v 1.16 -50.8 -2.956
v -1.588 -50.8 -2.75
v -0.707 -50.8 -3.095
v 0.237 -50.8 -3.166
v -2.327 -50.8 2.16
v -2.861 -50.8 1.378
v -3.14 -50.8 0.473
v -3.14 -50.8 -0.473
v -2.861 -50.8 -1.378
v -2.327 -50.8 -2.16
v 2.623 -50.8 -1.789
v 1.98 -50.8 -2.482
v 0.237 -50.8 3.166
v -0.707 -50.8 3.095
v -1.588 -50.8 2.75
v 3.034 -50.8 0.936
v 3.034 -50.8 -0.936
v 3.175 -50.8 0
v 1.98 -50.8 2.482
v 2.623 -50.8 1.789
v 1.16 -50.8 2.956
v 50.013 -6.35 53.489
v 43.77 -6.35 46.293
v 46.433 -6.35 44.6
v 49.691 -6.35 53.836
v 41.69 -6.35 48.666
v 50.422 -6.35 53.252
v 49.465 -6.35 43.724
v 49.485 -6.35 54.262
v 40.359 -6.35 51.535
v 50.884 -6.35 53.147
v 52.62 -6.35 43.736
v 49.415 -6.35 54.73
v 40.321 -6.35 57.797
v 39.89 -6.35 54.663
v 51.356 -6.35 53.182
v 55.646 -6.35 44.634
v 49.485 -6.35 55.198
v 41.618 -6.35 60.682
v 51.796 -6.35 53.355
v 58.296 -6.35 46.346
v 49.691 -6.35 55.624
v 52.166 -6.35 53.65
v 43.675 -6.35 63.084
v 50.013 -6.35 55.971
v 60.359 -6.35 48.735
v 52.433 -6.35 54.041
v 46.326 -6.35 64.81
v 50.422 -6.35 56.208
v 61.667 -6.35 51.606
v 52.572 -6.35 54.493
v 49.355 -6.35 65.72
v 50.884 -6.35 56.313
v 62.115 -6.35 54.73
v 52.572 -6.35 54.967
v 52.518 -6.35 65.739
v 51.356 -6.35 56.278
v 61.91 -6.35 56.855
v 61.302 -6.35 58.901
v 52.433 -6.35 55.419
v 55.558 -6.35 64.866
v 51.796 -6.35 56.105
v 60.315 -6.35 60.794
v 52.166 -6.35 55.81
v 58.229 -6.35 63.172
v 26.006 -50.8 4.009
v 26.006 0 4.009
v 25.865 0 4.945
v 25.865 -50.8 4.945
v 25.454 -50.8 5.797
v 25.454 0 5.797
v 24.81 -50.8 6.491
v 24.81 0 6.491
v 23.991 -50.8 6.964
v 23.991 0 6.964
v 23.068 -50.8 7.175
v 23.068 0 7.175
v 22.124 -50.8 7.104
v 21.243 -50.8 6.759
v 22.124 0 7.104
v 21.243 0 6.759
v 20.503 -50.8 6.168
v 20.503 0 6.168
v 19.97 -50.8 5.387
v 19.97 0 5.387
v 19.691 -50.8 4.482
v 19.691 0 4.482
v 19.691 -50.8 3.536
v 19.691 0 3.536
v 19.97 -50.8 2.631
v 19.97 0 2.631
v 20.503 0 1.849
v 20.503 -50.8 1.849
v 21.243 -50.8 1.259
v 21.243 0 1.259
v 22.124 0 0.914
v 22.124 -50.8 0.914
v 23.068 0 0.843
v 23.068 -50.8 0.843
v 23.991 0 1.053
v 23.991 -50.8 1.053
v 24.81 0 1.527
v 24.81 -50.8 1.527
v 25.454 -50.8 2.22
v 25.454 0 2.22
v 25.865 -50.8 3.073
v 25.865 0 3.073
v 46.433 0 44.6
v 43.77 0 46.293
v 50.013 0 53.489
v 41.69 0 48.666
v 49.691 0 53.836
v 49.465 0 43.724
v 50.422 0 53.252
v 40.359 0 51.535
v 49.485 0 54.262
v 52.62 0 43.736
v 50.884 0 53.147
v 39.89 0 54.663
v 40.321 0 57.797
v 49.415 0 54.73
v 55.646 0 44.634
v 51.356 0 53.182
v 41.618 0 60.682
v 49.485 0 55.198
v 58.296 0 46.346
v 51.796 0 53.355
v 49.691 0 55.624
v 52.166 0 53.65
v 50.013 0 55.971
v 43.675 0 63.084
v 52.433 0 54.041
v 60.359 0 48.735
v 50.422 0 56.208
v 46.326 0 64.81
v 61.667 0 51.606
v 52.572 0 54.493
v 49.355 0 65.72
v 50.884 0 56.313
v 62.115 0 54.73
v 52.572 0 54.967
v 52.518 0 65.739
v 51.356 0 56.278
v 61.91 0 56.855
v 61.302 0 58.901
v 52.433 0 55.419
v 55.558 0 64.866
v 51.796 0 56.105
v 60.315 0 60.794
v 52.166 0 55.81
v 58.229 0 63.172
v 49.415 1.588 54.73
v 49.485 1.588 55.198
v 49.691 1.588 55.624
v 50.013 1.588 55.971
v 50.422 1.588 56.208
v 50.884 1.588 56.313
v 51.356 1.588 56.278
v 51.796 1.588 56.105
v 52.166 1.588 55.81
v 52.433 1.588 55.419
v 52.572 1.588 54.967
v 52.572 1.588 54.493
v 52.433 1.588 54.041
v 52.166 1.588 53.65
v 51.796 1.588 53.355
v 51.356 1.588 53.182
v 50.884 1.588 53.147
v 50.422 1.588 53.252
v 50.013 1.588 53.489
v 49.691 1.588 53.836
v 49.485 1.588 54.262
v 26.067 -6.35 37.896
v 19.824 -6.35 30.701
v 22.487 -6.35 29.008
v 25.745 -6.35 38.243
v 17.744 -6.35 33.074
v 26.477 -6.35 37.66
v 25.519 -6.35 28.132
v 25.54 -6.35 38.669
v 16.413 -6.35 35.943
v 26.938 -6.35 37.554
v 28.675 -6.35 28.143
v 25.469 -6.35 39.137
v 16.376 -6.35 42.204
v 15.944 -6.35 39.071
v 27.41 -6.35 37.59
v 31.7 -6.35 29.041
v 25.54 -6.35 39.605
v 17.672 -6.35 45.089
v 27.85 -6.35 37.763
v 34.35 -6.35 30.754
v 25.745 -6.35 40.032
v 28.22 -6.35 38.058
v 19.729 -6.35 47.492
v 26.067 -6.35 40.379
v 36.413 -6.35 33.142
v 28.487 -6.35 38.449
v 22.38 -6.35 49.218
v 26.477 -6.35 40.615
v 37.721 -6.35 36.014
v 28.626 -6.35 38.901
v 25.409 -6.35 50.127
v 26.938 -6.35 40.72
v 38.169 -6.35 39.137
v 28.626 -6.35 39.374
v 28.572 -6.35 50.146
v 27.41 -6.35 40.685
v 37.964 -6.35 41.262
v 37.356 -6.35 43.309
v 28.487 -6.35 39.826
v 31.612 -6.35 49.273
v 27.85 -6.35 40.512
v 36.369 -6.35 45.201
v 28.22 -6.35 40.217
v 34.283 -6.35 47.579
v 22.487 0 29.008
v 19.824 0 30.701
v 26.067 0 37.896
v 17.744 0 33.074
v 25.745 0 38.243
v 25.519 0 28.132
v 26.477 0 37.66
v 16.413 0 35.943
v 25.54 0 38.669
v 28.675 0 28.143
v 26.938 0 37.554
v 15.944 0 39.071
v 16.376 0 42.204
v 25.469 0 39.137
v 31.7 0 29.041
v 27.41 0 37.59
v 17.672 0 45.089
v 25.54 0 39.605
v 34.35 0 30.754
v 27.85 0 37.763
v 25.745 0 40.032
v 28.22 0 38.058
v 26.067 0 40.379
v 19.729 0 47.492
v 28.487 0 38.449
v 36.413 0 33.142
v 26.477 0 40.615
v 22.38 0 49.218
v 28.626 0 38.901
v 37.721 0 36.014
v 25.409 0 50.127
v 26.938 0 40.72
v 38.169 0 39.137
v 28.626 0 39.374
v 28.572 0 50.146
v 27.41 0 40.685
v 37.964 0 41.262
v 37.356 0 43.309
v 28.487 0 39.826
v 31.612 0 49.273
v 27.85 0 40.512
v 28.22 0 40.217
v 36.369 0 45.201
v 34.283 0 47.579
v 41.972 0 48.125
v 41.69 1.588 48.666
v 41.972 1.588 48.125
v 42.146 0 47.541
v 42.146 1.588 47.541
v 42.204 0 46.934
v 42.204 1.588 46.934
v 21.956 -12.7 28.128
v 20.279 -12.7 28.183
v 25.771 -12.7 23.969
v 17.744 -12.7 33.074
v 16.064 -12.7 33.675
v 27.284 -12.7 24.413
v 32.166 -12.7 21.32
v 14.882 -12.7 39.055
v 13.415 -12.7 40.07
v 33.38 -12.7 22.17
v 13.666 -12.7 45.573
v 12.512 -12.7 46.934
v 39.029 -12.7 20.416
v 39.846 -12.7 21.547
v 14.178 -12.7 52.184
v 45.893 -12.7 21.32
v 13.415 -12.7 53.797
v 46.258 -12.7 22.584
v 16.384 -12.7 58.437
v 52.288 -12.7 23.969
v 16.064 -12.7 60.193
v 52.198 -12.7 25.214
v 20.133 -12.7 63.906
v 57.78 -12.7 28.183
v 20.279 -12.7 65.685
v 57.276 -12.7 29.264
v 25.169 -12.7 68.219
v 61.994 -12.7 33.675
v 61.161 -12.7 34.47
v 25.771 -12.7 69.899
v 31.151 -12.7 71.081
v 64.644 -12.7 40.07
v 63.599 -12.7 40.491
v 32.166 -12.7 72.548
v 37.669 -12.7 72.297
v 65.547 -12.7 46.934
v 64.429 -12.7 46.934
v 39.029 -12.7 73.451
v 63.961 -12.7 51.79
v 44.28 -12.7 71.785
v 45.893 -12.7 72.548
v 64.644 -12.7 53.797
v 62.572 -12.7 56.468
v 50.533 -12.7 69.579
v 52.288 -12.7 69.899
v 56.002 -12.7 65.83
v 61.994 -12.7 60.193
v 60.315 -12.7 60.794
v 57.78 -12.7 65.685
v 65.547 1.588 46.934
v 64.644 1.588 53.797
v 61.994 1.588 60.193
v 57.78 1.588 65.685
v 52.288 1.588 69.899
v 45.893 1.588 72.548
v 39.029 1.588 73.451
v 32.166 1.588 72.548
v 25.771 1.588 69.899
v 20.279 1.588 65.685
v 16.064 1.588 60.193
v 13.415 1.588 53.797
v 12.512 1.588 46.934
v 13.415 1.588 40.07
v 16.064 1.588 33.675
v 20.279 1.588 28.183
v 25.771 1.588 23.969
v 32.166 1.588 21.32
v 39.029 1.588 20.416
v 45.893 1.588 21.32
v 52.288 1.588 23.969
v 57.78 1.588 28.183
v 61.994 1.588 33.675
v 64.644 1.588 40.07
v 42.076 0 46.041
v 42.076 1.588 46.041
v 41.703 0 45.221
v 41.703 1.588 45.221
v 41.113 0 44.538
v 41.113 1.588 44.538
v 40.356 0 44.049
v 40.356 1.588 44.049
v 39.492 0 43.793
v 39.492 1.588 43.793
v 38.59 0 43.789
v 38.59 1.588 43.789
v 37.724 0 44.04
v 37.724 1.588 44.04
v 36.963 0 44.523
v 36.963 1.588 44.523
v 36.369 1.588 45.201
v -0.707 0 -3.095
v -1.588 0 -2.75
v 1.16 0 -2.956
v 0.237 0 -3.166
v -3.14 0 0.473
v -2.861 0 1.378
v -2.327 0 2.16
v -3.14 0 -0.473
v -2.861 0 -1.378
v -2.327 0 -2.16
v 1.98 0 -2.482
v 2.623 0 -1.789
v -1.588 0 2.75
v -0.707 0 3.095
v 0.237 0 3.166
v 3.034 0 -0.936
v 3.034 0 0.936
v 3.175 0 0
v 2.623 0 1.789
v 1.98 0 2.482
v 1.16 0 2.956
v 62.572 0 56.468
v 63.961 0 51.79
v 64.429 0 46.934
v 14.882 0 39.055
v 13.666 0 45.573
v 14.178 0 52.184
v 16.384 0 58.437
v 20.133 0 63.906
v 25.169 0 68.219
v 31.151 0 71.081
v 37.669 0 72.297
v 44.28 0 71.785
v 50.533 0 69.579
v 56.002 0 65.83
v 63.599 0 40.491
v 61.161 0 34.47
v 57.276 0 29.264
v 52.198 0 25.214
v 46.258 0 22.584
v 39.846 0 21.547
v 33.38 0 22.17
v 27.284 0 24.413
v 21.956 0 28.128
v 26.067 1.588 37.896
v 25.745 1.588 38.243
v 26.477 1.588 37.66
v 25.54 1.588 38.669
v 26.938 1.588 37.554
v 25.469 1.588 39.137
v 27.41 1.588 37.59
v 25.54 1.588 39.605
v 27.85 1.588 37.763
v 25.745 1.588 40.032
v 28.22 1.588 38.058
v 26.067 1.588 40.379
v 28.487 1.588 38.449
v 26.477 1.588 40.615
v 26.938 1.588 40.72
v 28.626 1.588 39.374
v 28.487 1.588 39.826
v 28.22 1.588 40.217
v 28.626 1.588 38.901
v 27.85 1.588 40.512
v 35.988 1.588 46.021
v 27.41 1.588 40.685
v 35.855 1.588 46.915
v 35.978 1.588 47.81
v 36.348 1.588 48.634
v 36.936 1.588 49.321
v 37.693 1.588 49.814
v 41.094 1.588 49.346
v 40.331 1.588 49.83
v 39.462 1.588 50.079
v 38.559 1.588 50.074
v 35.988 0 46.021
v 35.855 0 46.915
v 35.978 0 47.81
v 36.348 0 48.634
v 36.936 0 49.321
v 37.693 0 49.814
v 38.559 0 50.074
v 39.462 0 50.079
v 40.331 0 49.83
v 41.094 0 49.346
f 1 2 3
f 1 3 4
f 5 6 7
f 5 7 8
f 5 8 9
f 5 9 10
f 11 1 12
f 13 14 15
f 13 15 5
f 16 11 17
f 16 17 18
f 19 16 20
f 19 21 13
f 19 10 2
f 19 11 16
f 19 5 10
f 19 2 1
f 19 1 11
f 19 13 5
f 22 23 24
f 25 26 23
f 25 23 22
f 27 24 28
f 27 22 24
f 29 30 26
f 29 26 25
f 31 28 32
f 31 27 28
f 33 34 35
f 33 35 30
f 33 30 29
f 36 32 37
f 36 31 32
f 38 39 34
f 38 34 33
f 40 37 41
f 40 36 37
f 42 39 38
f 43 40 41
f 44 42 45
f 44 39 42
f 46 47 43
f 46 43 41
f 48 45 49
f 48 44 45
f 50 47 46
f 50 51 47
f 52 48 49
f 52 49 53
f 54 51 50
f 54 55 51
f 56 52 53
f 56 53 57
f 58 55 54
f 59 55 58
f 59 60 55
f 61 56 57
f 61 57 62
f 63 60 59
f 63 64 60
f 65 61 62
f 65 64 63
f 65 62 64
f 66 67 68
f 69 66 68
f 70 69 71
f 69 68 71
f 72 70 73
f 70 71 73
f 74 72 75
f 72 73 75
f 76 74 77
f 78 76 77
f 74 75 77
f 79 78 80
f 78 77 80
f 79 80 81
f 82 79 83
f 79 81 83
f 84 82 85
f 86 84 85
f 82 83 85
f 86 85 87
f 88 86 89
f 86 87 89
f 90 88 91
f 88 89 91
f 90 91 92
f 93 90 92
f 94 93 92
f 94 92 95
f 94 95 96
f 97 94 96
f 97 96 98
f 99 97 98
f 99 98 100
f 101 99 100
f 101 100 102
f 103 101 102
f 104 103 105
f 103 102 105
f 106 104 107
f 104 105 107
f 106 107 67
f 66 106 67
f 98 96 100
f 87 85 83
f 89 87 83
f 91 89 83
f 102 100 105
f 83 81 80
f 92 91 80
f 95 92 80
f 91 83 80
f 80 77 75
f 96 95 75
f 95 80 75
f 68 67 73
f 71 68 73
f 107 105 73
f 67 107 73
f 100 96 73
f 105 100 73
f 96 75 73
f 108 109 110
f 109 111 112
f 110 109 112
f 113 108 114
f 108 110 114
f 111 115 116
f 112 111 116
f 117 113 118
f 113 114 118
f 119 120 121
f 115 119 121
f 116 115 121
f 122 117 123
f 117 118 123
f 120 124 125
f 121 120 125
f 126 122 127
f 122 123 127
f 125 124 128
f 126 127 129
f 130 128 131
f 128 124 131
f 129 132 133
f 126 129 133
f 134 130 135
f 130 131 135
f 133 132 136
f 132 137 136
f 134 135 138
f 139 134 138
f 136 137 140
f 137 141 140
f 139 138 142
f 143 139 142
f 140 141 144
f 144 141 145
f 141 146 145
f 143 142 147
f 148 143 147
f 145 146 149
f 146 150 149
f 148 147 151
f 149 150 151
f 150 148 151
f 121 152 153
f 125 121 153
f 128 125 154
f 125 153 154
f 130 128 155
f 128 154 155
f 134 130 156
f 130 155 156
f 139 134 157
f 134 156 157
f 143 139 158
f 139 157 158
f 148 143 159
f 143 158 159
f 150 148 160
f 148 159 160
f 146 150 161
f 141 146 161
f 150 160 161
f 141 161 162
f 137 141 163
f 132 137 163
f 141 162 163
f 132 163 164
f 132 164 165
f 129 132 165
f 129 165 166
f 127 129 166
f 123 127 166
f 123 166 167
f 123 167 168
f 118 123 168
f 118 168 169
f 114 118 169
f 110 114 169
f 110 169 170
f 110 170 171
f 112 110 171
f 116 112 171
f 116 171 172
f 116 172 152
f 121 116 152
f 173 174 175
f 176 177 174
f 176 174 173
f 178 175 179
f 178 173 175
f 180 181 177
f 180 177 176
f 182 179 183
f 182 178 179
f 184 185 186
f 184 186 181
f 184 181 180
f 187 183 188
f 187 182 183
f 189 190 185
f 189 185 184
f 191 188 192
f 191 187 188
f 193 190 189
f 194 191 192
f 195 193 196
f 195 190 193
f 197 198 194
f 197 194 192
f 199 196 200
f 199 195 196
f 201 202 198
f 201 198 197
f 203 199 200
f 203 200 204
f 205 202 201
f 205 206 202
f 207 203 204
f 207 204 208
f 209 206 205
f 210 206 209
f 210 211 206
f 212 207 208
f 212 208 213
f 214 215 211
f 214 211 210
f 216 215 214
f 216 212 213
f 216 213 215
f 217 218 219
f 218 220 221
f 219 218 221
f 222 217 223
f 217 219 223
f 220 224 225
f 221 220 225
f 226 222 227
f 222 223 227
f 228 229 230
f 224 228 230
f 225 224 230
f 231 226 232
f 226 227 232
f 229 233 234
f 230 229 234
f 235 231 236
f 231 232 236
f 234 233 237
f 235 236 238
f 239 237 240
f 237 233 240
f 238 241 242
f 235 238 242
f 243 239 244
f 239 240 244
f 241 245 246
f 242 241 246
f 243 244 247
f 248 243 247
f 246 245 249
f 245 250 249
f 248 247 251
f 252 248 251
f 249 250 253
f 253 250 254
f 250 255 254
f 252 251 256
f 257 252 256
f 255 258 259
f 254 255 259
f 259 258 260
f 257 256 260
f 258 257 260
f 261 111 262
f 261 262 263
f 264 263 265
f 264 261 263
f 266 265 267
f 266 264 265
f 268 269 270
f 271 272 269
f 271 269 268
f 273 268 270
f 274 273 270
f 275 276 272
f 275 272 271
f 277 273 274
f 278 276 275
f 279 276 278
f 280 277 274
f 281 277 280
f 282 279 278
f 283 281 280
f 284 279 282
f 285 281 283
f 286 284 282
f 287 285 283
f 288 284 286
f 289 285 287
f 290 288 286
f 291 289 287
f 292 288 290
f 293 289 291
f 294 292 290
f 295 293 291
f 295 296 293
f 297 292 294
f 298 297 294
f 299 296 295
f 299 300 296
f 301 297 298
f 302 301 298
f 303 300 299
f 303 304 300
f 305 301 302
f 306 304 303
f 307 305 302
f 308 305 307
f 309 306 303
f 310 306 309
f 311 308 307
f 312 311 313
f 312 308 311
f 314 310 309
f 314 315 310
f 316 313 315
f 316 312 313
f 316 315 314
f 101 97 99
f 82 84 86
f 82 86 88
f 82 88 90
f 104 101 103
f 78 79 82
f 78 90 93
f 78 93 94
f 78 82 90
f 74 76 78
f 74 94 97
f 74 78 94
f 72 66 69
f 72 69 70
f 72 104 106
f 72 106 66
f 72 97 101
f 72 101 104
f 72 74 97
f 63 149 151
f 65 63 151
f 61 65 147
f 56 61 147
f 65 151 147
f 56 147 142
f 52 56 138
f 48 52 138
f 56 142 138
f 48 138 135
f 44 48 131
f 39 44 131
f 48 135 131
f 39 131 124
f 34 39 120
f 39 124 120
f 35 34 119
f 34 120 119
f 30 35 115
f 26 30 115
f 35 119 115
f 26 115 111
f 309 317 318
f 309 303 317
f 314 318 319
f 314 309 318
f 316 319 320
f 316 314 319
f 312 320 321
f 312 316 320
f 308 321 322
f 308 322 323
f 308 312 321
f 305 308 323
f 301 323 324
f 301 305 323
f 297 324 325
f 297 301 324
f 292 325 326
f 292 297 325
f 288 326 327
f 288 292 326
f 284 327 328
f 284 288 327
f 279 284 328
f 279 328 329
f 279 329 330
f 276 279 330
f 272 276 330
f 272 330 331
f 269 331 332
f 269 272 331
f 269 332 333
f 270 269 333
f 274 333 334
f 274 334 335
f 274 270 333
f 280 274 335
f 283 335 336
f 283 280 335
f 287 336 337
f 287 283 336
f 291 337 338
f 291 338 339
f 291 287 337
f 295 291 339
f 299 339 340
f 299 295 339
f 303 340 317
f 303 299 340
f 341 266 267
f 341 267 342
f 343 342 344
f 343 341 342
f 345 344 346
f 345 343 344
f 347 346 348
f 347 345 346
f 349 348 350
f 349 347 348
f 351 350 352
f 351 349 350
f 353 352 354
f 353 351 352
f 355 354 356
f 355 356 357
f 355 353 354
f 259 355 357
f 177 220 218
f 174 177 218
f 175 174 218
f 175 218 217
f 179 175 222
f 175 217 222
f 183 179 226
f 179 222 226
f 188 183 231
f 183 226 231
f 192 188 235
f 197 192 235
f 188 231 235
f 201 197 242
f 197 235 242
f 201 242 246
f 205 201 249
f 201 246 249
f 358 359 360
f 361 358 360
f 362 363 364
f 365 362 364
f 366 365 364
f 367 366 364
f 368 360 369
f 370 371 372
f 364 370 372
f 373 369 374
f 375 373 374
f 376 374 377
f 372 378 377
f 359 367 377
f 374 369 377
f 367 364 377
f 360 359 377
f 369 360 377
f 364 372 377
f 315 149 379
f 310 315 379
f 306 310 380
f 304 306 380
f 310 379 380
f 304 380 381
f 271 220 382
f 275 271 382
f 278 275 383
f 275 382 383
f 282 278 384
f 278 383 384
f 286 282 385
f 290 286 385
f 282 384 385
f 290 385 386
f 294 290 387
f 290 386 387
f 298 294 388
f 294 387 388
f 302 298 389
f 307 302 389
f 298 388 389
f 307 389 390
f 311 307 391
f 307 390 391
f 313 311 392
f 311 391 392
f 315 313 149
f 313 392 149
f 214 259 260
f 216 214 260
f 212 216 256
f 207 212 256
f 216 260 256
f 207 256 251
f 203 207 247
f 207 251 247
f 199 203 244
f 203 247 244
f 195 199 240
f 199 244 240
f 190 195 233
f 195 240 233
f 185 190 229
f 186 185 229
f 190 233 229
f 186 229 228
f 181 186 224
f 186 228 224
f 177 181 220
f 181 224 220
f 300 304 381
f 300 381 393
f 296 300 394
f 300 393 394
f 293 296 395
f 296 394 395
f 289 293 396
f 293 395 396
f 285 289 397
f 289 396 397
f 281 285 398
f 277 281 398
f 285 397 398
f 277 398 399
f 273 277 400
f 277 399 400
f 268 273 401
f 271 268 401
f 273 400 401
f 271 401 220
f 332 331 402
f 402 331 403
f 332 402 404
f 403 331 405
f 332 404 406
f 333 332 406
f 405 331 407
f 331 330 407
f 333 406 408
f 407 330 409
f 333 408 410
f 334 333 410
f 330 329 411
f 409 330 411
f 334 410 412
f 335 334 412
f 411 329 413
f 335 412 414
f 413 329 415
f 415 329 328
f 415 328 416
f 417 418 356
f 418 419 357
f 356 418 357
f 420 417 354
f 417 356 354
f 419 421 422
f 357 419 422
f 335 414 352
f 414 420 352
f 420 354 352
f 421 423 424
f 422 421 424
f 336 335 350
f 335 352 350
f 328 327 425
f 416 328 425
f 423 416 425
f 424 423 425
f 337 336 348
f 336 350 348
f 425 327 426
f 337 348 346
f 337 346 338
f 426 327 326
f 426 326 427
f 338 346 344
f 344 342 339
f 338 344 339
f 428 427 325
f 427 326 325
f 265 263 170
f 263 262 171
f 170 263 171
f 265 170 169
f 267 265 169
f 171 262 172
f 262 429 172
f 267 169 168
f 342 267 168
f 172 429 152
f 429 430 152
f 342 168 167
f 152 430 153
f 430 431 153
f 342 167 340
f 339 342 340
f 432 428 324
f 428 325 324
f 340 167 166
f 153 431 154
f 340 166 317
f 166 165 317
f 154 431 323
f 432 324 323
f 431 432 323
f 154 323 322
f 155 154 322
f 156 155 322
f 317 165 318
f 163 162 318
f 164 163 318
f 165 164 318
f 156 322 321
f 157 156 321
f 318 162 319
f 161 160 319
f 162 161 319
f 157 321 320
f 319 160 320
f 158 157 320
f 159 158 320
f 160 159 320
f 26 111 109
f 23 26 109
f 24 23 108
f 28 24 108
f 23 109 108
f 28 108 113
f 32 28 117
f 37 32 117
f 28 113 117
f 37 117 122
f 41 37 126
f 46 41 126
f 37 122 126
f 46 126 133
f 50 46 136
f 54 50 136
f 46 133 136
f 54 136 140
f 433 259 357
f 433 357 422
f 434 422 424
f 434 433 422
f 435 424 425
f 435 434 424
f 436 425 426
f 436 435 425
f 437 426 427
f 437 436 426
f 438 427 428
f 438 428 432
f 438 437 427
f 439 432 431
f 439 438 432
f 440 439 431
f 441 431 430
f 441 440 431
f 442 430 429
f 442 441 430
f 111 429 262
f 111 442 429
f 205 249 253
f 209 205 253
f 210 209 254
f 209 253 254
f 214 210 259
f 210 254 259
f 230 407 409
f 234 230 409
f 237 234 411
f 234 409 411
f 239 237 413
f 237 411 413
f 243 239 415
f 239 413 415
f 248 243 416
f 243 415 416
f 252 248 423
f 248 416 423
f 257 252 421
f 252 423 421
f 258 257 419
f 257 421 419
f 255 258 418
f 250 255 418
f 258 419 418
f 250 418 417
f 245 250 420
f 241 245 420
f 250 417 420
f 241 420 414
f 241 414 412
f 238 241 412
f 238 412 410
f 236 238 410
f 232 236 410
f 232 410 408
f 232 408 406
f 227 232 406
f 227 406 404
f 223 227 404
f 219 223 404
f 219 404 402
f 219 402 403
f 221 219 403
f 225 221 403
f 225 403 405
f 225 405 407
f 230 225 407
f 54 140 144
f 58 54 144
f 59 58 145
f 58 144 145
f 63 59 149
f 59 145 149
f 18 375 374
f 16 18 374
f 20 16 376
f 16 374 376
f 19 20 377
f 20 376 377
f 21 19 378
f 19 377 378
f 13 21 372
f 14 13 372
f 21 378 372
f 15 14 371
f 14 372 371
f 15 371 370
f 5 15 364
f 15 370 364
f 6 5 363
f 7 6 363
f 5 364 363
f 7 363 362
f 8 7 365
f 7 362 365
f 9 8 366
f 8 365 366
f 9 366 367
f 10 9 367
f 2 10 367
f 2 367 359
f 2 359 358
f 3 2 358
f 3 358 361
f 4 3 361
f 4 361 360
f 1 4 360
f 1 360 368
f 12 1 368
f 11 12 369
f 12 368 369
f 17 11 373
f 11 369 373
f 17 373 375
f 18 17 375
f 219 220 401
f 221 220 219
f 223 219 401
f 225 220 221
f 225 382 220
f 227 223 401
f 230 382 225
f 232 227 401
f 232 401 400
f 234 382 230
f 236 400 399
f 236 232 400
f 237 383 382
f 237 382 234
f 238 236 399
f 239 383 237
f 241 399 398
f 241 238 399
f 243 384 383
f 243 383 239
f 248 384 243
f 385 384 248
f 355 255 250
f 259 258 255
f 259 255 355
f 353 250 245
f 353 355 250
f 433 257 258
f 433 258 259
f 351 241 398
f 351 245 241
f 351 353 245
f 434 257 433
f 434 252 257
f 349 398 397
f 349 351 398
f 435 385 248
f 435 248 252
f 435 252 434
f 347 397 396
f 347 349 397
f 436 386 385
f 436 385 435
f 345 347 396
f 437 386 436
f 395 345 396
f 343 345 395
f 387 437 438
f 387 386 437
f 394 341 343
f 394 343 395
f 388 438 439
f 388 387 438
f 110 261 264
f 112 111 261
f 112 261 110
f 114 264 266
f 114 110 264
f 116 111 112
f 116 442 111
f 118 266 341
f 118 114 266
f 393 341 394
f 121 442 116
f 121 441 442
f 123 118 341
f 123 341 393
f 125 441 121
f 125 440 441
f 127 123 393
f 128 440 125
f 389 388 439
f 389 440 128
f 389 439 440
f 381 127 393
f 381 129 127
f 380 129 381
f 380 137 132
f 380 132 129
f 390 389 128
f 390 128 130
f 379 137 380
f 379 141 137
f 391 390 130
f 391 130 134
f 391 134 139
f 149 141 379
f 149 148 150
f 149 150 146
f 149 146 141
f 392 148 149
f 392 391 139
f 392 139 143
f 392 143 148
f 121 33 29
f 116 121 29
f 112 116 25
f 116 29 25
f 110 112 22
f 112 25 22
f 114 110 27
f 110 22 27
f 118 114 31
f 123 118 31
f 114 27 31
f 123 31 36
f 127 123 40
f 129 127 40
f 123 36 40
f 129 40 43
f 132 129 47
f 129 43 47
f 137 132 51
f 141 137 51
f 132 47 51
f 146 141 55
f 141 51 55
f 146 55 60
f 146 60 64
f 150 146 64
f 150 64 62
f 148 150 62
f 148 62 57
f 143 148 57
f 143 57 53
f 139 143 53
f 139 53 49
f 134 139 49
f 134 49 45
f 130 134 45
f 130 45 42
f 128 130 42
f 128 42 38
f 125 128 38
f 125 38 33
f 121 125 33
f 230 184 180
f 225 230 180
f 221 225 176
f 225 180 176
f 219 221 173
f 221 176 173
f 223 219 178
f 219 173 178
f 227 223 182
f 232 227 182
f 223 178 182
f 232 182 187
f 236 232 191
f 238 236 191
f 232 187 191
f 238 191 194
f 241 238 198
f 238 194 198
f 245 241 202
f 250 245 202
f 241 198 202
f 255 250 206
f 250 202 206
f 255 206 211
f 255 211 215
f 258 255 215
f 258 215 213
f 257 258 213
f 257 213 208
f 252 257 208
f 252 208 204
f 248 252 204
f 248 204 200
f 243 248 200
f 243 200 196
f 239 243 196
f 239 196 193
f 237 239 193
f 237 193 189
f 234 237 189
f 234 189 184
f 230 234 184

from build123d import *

# Parameters (mm, degrees)
F0_R     = 3.175
F1_DEPTH = 50.8
F2_DEPTH = 50.8
F3_R     = 26.5176901182
F4_DEPTH = 12.7
F5_DEPTH = 1.5875
F6_DEPTH = 1.5875
F7_DEPTH = 6.35
F8_D     = 3.175
F8_2_D   = 3.175
F9_D     = 3.175


with BuildPart() as f1:
    # F0 (on Front) → F1 (new body)
    with BuildSketch(Plane.XZ):
        Circle(F0_R)
    extrude(amount=F1_DEPTH)


with BuildPart() as f2:
    # F0 (on Front) → F2 (new body)
    with BuildSketch(Plane.XZ):
        with Locations((22.8306278586, 4.0089422837)):
            Circle(F0_R)
    extrude(amount=F2_DEPTH)


with BuildPart() as f4:
    # F3 (on Front) → F4 (new body)
    with BuildSketch(Plane.XZ):
        with Locations((39.0294722857, 46.9336968206)):
            Circle(F3_R)
        with BuildLine():
            ThreePointArc((60.314654032, 60.7937486974), (63.3790473986, 54.162679586), (64.4294722857, 46.9336968206))
            ThreePointArc((64.4294722857, 46.9336968206), (46.2584550511, 22.5841217077), (17.7442905394, 33.0736449439))
            ThreePointArc((17.7442905394, 33.0736449439), (25.169420409, 68.2188785669), (60.314654032, 60.7937486974))
        make_face(mode=Mode.SUBTRACT)
    extrude(amount=F4_DEPTH)

    # F3 (on Front) → F5 (join)
    with BuildSketch(Plane.XZ):
        with Locations((39.0294722857, 46.9336968206)):
            Circle(F3_R)
        with BuildLine():
            ThreePointArc((60.314654032, 60.7937486974), (63.3790473986, 54.162679586), (64.4294722857, 46.9336968206))
            ThreePointArc((64.4294722857, 46.9336968206), (46.2584550511, 22.5841217077), (17.7442905394, 33.0736449439))
            ThreePointArc((17.7442905394, 33.0736449439), (25.169420409, 68.2188785669), (60.314654032, 60.7937486974))
        make_face(mode=Mode.SUBTRACT)
    extrude(amount=-F5_DEPTH)

    # F3 (on Front) → F6 (join)
    with BuildSketch(Plane.XZ):
        with BuildLine():
            ThreePointArc((36.3688245948, 45.2011902941), (20.9927850841, 48.4496843517), (17.7442905394, 33.0736449439))
            ThreePointArc((17.7442905394, 33.0736449439), (30.2192375383, 28.4844781585), (38.1690577592, 39.137417324))
            ThreePointArc((38.1690577592, 39.137417324), (37.7094968245, 42.3000974406), (36.3688245948, 45.2011902941))
        make_face()
        with BuildLine():
            ThreePointArc((62.1148868123, 54.7299763172), (61.6553259779, 57.8926560964), (60.314654032, 60.7937486974))
            ThreePointArc((60.314654032, 60.7937486974), (44.9386141663, 64.0422433638), (41.6901199388, 48.6662034053))
            ThreePointArc((41.6901199388, 48.6662034053), (54.1650668956, 44.077037242), (62.1148868123, 54.7299763172))
        make_face()
        with BuildLine():
            ThreePointArc((17.7442905394, 33.0736449439), (46.2584550511, 22.5841217077), (64.4294722857, 46.9336968206))
            ThreePointArc((64.4294722857, 46.9336968206), (63.3790473986, 54.162679586), (60.314654032, 60.7937486974))
            ThreePointArc((60.314654032, 60.7937486974), (61.6553259779, 57.8926560964), (62.1148868123, 54.7299763172))
            ThreePointArc((62.1148868123, 54.7299763172), (54.1650668956, 44.077037242), (41.6901199388, 48.6662034053))
            ThreePointArc((41.6901199388, 48.6662034053), (42.0731691578, 47.8373197236), (42.2044722857, 46.9336968206))
            ThreePointArc((42.2044722857, 46.9336968206), (39.9330951554, 43.8899999386), (36.3688245948, 45.2011902941))
            ThreePointArc((36.3688245948, 45.2011902941), (37.7094968245, 42.3000974406), (38.1690577592, 39.137417324))
            ThreePointArc((38.1690577592, 39.137417324), (30.2192375383, 28.4844781585), (17.7442905394, 33.0736449439))
        make_face()
        with BuildLine():
            ThreePointArc((41.6901199388, 48.6662034053), (44.9386141663, 64.0422433638), (60.314654032, 60.7937486974))
            ThreePointArc((60.314654032, 60.7937486974), (25.169420409, 68.2188785669), (17.7442905394, 33.0736449439))
            ThreePointArc((17.7442905394, 33.0736449439), (20.9927850841, 48.4496843517), (36.3688245948, 45.2011902941))
            ThreePointArc((36.3688245948, 45.2011902941), (37.2969657301, 49.5943444927), (41.6901199388, 48.6662034053))
        make_face()
    extrude(amount=-F6_DEPTH)

    # F9 (through all)
    with Locations(Plane.XZ):
        with Locations((51.0023868123, 54.7299763172), (27.0565577592, 39.137417324)):
            Hole(F9_D / 2)


with BuildPart() as f7:
    # F3 (on Front) → F7 (new body)
    with BuildSketch(Plane.XZ):
        with BuildLine():
            ThreePointArc((62.1148868123, 54.7299763172), (61.6553259779, 57.8926560964), (60.314654032, 60.7937486974))
            ThreePointArc((60.314654032, 60.7937486974), (44.9386141663, 64.0422433638), (41.6901199388, 48.6662034053))
            ThreePointArc((41.6901199388, 48.6662034053), (54.1650668956, 44.077037242), (62.1148868123, 54.7299763172))
        make_face()
    extrude(amount=F7_DEPTH)

    # F8 (through all)
    with Locations(Plane(origin=(0, 0, 0), x_dir=(1, 0, 0), z_dir=(0, 1, 0))):
        with Locations((27.0565577592, -39.137417324), (51.0023868123, -54.7299763172)):
            Hole(F8_D / 2)


with BuildPart() as f7b:
    # F3 (on Front) → F7, piece 2 (new body)
    with BuildSketch(Plane.XZ):
        with BuildLine():
            ThreePointArc((36.3688245948, 45.2011902941), (20.9927850841, 48.4496843517), (17.7442905394, 33.0736449439))
            ThreePointArc((17.7442905394, 33.0736449439), (30.2192375383, 28.4844781585), (38.1690577592, 39.137417324))
            ThreePointArc((38.1690577592, 39.137417324), (37.7094968245, 42.3000974406), (36.3688245948, 45.2011902941))
        make_face()
    extrude(amount=F7_DEPTH)

    # F8#2 (through all)
    with Locations(Plane(origin=(0, 0, 0), x_dir=(1, 0, 0), z_dir=(0, 1, 0))):
        with Locations((27.0565577592, -39.137417324), (51.0023868123, -54.7299763172)):
            Hole(F8_2_D / 2)


solid = Compound([f1.part, f2.part, f4.part, f7.part, f7b.part])
